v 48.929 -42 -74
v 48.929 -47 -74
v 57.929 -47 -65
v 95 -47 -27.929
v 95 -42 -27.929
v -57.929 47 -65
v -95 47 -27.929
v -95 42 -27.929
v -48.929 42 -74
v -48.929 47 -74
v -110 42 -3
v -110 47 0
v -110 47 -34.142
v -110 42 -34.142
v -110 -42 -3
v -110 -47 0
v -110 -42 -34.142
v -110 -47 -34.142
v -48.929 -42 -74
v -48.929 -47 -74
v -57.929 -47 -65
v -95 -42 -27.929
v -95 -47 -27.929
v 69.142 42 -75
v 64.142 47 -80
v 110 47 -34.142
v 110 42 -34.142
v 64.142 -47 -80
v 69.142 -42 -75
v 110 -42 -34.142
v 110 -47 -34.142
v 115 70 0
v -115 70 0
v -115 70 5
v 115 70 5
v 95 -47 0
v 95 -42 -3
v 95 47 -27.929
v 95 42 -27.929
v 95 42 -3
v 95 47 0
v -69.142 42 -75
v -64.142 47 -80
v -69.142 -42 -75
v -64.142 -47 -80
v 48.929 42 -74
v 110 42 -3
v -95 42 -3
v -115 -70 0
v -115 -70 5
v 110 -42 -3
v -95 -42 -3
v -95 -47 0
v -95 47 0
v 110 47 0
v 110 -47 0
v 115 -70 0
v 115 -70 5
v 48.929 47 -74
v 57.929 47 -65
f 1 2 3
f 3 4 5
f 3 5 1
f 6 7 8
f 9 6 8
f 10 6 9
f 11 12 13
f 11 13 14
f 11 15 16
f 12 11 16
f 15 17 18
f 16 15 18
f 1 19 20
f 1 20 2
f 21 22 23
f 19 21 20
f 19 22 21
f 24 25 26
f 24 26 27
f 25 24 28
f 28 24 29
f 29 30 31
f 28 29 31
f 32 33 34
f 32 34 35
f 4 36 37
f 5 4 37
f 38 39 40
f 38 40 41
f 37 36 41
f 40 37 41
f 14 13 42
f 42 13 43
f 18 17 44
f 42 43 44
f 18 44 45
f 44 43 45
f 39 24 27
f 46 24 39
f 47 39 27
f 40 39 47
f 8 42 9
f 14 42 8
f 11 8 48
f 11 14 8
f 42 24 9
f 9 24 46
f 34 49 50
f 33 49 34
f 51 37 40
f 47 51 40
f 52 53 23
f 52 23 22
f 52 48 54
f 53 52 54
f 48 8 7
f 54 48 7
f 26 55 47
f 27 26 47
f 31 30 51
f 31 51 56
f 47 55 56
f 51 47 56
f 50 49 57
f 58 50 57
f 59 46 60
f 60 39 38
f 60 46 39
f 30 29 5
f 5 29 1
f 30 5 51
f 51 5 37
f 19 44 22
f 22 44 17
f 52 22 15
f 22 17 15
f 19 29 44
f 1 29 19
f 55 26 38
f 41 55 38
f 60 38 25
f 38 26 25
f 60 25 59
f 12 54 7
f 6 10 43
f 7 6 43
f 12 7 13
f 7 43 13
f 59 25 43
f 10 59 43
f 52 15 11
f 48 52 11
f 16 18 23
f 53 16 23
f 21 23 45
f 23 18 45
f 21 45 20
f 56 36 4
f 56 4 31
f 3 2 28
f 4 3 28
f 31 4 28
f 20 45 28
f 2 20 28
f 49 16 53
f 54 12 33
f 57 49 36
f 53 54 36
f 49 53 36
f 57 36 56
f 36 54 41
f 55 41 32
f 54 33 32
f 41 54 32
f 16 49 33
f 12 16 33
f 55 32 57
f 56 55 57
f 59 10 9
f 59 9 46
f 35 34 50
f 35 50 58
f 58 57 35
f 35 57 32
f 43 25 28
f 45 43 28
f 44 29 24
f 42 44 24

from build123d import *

# Parameters (mm, degrees)
SKETCH1_W           = 230
SKETCH1_H           = 140
BOSS_EXTRUDE1_DEPTH = 5
SKETCH4_W           = 15
SKETCH4_H           = 94
CUT_EXTRUDE1_DEPTH  = 118
SKETCH7_W           = 72
SKETCH7_H           = 84
CUT_EXTRUDE2_DEPTH  = 226


with BuildPart() as part:
    # Sketch1 → Boss-Extrude1 (new body)
    with BuildSketch(Plane.XY):
        Rectangle(SKETCH1_W, SKETCH1_H)
    extrude(amount=BOSS_EXTRUDE1_DEPTH)

    # Sweep3: sweep along a path in Sketch5
    with BuildLine(Plane(origin=(0, 0, 0), x_dir=(1, 0, 0), z_dir=(0, 1, 0))) as sweep3_path:
        Line((-100, 0), (-100, 30))
        Line((-100, 30), (-60, 70))
        Line((-60, 70), (60, 70))
        Line((60, 70), (100, 30))
        Line((100, 30), (100, 0))
    # Sketch4 → Sweep3 (sweep)
    with BuildSketch(Plane.XY):
        with Locations((-102.5, 0)):
            Rectangle(SKETCH4_W, SKETCH4_H)
    sweep(path=sweep3_path.line, transition=Transition.RIGHT)

    # Sketch6 → Cut-Extrude1 (cut, through all)
    with BuildSketch(Plane(origin=(0, 47, 0), x_dir=(1, 0, 0), z_dir=(0, 1, 0))):
        Polygon((-48.928932188, 74), (48.928932188, 74), (76.464466094, 46.464466094), (-76.464466094, 46.464466094), align=None)
    extrude(amount=-CUT_EXTRUDE1_DEPTH, mode=Mode.SUBTRACT)

    # Sketch7 → Cut-Extrude2 (cut, through all)
    with BuildSketch(Plane.ZY.offset(110)):
        with Locations((-39, 0)):
            Rectangle(SKETCH7_W, SKETCH7_H)
    extrude(amount=-CUT_EXTRUDE2_DEPTH, mode=Mode.SUBTRACT)


solid = part.part
